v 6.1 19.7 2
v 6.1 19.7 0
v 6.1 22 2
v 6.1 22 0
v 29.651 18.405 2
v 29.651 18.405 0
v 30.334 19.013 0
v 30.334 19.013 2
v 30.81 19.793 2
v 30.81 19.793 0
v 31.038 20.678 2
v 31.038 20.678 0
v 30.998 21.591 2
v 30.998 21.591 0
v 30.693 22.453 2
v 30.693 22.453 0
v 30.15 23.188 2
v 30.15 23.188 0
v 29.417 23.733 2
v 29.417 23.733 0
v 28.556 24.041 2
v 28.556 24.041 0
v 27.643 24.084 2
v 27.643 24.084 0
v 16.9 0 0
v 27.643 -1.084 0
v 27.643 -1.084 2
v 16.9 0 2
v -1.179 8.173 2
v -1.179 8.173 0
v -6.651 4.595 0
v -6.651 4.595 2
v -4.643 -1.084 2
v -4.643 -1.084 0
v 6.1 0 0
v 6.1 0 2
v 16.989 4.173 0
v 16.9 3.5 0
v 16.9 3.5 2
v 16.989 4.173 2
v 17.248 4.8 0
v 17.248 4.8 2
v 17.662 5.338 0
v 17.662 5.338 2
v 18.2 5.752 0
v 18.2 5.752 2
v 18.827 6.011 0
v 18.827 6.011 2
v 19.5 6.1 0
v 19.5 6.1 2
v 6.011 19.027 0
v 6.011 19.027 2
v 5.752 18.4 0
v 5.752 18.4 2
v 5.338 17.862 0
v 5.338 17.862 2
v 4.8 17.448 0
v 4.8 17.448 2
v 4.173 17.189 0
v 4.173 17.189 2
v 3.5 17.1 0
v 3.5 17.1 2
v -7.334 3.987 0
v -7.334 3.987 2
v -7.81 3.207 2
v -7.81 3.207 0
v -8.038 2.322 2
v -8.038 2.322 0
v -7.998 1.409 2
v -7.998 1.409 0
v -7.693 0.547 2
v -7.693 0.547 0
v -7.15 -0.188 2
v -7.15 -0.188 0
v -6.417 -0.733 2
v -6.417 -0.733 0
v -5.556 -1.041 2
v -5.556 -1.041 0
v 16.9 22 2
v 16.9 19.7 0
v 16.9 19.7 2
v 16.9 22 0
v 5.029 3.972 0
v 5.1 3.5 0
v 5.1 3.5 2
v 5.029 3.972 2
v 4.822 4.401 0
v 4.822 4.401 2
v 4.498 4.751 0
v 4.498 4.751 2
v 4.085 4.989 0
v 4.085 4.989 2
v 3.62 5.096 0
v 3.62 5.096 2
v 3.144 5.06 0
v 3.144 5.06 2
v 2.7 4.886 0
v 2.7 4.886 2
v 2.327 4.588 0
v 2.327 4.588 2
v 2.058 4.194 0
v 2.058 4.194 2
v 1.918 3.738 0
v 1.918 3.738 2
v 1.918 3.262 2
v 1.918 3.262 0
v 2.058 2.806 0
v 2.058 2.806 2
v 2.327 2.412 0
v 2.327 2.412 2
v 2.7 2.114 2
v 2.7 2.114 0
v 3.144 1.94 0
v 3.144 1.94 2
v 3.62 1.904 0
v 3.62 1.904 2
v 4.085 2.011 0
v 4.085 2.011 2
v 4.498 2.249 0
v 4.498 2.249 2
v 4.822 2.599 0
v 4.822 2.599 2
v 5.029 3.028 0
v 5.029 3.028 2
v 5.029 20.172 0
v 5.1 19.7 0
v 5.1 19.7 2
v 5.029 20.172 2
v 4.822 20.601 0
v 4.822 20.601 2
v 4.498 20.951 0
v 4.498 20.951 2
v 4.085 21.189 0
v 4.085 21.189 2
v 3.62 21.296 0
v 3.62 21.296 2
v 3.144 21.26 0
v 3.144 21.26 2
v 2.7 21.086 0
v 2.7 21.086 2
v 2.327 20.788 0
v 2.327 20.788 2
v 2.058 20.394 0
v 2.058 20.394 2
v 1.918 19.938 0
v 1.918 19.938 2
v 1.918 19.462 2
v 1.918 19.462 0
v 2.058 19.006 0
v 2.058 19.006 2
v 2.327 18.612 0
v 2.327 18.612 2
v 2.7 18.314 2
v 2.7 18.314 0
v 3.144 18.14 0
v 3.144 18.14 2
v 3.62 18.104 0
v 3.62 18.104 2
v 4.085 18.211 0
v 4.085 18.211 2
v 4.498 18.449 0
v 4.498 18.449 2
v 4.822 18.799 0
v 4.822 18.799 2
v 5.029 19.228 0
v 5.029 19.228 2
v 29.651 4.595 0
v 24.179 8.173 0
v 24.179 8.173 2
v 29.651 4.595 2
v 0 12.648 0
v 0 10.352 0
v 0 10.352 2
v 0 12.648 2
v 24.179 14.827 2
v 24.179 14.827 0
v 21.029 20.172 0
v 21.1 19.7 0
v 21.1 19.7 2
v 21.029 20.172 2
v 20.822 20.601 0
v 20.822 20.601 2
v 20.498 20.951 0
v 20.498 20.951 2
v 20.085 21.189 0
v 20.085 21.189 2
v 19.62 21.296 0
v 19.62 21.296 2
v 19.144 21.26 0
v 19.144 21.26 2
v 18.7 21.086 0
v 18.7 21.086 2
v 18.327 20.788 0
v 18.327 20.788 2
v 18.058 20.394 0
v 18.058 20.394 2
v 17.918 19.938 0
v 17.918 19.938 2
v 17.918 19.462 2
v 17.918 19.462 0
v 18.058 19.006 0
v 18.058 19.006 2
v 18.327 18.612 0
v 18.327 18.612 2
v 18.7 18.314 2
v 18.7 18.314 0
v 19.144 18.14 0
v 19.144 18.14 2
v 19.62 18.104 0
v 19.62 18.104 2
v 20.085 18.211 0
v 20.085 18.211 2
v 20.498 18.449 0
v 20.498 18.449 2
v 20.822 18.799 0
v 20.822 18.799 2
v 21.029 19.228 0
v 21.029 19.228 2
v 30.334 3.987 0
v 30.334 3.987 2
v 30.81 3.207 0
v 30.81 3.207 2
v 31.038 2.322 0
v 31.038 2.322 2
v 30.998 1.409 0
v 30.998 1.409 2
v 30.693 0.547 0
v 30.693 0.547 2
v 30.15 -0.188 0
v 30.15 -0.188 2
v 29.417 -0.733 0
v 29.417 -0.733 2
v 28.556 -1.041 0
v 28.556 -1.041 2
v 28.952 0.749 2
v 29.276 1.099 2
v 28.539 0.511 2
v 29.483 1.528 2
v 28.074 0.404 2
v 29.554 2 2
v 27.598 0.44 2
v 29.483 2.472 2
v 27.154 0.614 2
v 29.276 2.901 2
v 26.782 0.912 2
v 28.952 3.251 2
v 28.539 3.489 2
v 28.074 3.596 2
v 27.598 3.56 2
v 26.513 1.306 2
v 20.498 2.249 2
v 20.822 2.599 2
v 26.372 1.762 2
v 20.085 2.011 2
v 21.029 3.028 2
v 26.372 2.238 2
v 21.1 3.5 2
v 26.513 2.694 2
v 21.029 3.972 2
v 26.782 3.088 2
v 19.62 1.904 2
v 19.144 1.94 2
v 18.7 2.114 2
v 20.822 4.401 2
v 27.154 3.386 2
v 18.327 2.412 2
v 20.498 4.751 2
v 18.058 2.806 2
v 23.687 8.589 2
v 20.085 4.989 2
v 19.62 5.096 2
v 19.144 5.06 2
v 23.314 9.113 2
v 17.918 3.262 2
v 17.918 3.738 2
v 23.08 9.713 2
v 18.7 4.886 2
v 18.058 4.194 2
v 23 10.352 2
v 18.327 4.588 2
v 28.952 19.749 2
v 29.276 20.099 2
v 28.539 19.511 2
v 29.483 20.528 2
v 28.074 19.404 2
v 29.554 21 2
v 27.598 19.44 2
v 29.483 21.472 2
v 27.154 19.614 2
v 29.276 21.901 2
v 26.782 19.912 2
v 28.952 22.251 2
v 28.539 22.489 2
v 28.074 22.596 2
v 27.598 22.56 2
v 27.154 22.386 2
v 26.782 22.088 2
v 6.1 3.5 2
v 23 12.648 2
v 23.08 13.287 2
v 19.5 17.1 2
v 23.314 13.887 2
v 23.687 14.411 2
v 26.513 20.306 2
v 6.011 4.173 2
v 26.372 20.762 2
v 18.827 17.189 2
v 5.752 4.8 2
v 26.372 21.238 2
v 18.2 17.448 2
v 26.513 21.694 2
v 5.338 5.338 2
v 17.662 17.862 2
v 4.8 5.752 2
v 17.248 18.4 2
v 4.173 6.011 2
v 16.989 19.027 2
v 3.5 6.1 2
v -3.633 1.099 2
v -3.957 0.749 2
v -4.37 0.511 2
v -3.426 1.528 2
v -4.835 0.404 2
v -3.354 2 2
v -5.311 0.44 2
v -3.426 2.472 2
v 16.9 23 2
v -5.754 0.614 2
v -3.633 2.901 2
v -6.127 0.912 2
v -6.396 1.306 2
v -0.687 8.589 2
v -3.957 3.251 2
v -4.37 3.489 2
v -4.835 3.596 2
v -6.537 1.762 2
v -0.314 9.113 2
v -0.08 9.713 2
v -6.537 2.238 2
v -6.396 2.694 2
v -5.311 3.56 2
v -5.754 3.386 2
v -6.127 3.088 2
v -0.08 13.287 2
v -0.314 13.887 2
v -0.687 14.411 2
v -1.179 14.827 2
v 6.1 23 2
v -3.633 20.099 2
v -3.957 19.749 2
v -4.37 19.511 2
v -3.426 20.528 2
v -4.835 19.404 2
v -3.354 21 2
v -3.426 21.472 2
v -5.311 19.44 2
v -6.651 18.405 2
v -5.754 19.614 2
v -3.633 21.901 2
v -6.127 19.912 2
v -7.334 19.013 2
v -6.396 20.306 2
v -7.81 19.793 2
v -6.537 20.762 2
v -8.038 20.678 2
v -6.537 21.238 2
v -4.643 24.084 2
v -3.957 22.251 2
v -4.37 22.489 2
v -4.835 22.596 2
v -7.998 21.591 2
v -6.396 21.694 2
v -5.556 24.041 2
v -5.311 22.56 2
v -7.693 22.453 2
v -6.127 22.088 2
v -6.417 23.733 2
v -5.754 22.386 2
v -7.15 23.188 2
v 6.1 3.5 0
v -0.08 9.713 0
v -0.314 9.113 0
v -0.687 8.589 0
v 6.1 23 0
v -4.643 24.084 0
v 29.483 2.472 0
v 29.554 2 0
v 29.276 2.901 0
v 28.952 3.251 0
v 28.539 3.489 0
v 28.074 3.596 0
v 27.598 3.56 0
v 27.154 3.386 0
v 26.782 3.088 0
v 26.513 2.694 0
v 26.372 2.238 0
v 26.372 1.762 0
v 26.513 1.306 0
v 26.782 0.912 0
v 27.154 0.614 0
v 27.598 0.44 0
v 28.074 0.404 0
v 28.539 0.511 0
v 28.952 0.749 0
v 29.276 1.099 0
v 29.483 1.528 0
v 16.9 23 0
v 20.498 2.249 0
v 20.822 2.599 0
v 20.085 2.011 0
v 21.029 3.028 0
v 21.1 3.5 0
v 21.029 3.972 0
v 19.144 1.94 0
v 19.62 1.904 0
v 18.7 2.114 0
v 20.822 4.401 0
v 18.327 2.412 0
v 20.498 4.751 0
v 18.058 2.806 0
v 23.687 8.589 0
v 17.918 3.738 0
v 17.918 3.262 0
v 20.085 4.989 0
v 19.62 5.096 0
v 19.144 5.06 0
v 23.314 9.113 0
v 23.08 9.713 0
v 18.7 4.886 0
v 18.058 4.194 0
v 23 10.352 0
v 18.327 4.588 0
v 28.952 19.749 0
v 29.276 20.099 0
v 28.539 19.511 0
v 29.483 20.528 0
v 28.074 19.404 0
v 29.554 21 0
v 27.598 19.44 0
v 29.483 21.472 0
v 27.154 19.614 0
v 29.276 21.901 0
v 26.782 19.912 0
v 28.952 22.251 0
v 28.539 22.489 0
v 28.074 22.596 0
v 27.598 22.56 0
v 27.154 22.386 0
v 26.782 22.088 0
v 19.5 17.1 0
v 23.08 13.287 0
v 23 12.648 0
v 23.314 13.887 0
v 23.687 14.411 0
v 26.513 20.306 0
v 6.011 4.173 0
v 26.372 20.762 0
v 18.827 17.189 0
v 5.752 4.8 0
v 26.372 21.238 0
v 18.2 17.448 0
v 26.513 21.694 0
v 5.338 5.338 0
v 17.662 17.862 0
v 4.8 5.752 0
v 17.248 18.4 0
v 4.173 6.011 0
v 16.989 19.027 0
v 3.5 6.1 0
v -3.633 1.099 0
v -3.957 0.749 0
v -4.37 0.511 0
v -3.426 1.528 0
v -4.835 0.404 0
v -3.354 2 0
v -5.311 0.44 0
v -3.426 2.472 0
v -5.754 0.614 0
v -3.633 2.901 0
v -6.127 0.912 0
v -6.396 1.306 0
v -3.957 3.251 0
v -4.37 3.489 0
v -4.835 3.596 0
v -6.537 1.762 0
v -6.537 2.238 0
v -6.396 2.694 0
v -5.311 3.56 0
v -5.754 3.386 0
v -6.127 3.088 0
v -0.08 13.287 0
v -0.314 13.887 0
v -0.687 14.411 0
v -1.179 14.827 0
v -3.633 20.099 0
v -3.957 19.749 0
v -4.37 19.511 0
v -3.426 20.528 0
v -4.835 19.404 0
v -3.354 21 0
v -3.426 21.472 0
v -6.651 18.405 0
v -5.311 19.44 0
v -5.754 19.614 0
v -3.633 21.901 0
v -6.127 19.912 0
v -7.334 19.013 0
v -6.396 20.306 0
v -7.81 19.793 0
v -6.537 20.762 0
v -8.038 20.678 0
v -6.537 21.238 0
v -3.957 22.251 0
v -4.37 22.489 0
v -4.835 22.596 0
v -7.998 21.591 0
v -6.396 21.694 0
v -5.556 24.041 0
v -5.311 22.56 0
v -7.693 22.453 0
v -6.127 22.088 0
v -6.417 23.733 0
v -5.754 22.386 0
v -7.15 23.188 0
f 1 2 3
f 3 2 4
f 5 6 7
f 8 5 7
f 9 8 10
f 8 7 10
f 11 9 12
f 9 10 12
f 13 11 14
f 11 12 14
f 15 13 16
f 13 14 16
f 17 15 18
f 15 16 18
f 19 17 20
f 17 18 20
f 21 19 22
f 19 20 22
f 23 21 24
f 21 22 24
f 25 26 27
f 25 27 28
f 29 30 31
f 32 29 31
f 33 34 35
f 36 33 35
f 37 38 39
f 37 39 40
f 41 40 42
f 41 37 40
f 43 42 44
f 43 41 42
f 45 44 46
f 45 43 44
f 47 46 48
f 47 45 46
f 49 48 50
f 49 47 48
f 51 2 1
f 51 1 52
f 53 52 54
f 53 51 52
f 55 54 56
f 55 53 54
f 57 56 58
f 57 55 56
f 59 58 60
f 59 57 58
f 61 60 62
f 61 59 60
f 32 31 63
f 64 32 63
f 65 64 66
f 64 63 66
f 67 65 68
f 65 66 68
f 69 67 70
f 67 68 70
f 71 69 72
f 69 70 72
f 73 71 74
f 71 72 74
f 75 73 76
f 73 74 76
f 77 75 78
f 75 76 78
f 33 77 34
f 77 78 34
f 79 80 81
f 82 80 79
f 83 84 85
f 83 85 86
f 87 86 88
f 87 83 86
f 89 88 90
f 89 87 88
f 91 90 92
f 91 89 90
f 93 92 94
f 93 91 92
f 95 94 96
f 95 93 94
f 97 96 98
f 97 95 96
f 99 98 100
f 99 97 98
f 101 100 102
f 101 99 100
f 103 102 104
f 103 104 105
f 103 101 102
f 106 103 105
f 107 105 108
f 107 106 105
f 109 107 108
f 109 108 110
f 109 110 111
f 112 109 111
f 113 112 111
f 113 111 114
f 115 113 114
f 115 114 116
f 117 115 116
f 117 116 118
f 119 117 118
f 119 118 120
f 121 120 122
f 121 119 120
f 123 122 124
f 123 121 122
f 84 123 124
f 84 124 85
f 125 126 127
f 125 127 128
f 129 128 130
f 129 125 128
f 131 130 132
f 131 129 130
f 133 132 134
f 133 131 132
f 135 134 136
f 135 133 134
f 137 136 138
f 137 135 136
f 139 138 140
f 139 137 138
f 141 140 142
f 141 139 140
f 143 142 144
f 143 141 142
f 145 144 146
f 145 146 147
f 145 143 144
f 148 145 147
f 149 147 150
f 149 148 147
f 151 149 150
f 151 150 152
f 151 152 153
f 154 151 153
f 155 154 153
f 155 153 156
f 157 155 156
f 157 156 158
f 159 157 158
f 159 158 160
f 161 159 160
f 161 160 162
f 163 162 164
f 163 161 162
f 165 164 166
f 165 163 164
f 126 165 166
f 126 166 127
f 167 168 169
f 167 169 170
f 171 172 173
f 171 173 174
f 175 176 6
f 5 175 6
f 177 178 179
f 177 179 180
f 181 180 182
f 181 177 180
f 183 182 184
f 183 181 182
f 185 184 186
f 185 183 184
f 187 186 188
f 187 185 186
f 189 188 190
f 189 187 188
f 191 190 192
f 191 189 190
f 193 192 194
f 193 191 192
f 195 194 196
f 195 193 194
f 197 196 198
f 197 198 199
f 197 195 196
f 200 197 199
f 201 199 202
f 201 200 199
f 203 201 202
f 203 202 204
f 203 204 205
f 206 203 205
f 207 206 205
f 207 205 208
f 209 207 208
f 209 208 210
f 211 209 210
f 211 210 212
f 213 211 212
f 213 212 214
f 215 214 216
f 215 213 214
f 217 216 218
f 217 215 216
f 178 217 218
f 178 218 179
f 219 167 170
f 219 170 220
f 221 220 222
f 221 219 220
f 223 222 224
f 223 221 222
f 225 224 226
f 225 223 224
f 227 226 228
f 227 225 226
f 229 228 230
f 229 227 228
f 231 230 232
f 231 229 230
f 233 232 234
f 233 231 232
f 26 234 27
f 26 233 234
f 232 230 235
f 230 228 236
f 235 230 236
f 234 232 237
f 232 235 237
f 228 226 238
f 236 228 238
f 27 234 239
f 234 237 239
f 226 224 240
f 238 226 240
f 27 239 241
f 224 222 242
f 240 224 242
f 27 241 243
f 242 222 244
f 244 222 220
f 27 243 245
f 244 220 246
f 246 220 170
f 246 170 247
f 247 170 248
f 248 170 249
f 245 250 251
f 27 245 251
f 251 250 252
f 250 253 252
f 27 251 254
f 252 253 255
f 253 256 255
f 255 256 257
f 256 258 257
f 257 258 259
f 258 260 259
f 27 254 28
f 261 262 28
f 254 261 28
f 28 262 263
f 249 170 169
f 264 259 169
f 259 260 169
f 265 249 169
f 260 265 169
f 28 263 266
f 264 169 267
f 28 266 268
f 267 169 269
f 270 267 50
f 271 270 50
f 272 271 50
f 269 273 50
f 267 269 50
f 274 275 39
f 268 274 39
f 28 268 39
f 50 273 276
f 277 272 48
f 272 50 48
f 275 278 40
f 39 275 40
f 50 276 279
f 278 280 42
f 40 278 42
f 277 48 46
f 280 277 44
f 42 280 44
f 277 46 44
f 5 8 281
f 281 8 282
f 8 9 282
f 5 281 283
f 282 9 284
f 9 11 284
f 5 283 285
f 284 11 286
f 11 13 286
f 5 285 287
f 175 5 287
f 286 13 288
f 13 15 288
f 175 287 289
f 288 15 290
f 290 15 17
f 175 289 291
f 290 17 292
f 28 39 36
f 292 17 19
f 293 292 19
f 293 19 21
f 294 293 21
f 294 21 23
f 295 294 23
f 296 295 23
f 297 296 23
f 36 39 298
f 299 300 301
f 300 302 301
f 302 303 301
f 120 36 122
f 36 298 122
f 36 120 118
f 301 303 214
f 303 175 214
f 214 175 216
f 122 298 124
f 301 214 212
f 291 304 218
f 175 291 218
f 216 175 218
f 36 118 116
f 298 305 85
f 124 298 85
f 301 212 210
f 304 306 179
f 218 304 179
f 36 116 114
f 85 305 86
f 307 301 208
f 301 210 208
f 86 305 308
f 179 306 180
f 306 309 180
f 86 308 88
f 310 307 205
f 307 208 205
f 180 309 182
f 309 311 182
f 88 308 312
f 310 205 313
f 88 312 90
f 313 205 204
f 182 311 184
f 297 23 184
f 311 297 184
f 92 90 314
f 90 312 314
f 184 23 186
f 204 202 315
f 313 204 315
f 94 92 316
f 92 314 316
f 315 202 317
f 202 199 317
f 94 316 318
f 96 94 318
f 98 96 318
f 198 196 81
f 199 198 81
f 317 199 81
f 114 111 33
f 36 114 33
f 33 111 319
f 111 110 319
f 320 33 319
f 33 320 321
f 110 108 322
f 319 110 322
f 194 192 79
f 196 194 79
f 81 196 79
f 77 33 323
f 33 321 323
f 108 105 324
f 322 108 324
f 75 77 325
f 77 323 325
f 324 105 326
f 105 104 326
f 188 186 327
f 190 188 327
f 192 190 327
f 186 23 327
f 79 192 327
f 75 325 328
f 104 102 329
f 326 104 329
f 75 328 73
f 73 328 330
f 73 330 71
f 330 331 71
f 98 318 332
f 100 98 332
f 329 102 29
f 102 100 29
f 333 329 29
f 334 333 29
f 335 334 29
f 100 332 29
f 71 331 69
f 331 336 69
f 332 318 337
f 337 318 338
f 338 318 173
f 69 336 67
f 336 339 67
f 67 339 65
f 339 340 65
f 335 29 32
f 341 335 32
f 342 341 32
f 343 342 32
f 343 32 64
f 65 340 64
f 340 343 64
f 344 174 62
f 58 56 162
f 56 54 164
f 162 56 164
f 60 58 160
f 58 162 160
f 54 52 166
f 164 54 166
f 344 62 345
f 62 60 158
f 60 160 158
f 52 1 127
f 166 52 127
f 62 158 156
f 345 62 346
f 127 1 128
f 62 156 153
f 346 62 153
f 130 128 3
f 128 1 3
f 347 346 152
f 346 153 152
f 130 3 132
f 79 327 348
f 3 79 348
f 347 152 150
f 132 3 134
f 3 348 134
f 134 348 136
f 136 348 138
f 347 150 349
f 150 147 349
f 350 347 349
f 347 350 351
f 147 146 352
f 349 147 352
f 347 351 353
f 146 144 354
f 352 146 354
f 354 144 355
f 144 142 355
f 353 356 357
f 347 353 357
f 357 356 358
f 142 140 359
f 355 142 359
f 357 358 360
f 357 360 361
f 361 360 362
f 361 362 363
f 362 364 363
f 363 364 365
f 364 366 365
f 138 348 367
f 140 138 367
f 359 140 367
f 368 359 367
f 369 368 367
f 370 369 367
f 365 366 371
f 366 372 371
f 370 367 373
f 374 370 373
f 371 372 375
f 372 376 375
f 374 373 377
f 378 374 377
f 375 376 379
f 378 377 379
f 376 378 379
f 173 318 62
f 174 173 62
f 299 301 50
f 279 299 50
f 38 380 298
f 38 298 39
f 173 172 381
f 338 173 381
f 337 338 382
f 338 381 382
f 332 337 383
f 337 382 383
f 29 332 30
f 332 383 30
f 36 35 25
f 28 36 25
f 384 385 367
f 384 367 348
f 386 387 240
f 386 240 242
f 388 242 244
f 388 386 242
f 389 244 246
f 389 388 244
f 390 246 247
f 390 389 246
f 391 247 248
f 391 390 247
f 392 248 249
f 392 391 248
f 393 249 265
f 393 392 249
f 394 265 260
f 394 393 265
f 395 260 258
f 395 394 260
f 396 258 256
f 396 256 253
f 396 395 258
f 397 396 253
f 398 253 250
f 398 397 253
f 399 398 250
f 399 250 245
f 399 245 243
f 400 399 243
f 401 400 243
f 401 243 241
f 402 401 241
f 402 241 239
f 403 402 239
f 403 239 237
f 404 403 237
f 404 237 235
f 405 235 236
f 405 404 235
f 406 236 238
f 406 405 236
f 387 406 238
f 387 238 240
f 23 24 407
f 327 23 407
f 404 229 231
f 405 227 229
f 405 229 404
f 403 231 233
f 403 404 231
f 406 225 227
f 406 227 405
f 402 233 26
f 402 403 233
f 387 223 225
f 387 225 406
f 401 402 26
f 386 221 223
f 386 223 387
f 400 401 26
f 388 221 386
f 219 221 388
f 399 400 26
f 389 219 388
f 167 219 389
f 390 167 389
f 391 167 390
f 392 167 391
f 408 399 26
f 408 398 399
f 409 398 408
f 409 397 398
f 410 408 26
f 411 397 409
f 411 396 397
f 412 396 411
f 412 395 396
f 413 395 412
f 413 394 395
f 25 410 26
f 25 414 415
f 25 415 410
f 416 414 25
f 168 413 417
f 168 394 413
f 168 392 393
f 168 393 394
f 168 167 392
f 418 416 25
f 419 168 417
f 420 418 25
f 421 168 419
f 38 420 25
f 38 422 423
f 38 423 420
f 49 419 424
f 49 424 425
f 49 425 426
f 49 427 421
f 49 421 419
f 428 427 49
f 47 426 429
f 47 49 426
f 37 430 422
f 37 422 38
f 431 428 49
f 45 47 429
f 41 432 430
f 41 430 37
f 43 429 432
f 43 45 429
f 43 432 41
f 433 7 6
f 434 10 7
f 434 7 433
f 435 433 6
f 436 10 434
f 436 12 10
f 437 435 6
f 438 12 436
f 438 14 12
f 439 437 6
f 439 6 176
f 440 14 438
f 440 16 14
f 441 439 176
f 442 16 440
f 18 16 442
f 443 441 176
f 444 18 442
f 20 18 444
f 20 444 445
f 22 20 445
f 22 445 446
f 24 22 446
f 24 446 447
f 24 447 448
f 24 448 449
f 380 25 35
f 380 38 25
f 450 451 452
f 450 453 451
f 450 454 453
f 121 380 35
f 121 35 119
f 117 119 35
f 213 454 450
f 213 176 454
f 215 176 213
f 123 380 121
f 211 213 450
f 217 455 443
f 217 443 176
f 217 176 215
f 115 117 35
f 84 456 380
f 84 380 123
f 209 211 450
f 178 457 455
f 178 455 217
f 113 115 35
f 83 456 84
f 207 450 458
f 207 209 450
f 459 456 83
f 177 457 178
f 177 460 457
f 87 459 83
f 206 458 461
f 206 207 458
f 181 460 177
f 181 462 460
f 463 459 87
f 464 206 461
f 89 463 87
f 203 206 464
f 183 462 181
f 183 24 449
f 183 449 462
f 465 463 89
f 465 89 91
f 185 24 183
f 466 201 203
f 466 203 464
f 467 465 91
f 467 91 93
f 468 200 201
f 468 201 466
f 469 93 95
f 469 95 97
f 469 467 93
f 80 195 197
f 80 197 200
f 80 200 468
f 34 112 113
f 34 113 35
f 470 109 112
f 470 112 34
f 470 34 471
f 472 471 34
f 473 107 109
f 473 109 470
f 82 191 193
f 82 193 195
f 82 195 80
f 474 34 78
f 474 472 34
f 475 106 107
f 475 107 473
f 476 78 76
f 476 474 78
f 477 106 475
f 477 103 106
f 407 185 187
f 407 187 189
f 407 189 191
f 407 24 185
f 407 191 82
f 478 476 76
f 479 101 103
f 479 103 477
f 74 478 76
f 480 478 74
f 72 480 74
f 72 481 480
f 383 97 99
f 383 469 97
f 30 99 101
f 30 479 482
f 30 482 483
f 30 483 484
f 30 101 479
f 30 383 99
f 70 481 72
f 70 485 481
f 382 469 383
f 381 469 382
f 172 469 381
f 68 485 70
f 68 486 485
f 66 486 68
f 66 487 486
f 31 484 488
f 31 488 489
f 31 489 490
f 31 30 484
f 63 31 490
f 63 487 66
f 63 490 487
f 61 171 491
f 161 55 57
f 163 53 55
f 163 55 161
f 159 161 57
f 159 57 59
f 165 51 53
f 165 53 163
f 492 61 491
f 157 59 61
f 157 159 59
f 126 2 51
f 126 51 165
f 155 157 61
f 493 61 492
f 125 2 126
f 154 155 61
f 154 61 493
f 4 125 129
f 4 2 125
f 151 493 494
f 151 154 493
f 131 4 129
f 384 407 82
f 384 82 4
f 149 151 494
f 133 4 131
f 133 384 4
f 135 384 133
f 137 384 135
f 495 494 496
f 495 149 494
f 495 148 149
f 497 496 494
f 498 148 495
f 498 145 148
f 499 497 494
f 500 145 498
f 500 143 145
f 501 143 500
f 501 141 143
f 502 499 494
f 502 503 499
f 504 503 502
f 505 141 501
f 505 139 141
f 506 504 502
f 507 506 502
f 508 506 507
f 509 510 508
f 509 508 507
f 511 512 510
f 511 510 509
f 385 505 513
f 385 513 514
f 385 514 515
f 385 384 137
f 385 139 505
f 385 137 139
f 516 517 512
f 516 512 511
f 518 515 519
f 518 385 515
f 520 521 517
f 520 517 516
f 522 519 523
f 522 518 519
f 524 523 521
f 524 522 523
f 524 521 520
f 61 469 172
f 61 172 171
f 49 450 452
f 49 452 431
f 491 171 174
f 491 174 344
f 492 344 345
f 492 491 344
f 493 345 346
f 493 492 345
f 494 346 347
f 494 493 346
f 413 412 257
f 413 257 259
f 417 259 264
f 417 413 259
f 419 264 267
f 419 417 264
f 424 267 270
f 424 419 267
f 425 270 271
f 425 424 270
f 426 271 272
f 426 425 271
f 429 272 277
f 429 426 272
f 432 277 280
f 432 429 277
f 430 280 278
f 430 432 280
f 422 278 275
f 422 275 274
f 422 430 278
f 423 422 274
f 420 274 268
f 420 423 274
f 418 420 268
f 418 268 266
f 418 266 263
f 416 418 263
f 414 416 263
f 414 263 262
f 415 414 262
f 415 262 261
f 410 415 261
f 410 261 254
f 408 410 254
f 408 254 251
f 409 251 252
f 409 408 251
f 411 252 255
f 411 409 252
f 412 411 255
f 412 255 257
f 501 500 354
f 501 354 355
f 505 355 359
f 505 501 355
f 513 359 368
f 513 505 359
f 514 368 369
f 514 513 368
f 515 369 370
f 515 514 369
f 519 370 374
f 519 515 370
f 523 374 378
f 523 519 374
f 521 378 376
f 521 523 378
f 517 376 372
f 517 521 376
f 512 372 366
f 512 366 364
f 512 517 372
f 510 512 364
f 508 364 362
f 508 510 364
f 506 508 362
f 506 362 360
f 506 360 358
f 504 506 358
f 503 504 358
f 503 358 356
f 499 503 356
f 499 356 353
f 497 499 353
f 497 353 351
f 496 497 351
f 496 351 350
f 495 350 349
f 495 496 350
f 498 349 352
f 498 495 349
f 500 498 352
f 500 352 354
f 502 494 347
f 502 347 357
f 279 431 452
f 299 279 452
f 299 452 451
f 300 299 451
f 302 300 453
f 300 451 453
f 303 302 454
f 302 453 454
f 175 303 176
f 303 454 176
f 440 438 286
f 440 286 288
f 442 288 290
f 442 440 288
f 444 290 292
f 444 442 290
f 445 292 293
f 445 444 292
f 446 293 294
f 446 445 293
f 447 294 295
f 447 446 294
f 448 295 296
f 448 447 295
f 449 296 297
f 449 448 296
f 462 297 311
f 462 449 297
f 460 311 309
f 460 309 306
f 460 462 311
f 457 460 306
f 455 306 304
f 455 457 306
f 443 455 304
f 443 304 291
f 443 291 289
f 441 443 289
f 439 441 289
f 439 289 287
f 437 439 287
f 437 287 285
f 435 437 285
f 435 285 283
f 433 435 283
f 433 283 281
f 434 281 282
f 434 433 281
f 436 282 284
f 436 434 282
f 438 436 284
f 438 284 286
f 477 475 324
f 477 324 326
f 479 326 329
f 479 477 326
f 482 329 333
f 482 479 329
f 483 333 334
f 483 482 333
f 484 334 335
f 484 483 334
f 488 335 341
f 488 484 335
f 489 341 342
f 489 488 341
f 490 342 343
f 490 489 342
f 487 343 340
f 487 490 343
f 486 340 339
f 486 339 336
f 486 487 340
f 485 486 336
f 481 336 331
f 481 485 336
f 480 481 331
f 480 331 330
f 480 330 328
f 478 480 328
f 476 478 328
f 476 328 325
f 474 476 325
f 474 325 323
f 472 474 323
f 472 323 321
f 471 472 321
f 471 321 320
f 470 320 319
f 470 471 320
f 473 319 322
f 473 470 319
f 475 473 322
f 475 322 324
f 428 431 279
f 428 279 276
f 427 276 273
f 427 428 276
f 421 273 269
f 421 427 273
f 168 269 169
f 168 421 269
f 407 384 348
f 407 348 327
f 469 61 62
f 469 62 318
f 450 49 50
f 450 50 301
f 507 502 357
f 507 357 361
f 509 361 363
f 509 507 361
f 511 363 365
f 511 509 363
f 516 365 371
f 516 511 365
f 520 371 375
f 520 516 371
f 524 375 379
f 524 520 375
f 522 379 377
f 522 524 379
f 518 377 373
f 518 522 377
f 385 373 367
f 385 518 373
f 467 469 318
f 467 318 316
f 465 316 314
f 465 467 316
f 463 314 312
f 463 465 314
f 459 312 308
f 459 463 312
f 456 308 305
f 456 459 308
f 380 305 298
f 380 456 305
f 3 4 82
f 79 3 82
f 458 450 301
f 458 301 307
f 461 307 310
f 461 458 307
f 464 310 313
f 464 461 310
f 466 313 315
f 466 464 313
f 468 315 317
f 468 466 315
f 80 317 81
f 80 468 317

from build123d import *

# Parameters (mm, degrees)
SKETCH1_W             = 23
SKETCH1_H             = 23
BOSS_EXTRUDE1_DEPTH   = 2
FILLET1_R             = 2
SKETCH2_R             = 1.6
CUT_EXTRUDE1_DEPTH    = 2
SKETCH3_W             = 10.8
SKETCH3_H             = 2.3
CUT_EXTRUDE2_DEPTH    = 2
SKETCH5_R             = 1.6
BOSS_EXTRUDE2_DEPTH   = 2
BOSS_EXTRUDE2_2_DEPTH = 2
BOSS_EXTRUDE2_3_DEPTH = 2
BOSS_EXTRUDE2_4_DEPTH = 2


with BuildPart() as part:
    # Sketch1 → Boss-Extrude1 (new body)
    with BuildSketch(Plane.XY):
        with Locations((11.5, 11.5)):
            Rectangle(SKETCH1_W, SKETCH1_H)
    extrude(amount=BOSS_EXTRUDE1_DEPTH)

    # Fillet1
    fillet1_edges = [part.edges().sort_by_distance(p)[0] for p in [
        (0, 23, 1),
        (23, 23, 1),
        (23, 0, 1),
        (0, 0, 1),
    ]]
    fillet(fillet1_edges, radius=FILLET1_R)

    # Sketch2 → Cut-Extrude1 (cut)
    with BuildSketch(Plane.XY):
        with Locations((3.5, 19.7)):
            Circle(SKETCH2_R)
        with Locations((19.5, 19.7)):
            Circle(SKETCH2_R)
        with Locations((19.5, 3.5)):
            Circle(SKETCH2_R)
        with Locations((3.5, 3.5)):
            Circle(SKETCH2_R)
        with BuildLine():
            Line((3.5, 17.1), (3.5, 6.1))
            ThreePointArc((3.5, 6.1), (5.338477631, 5.338477631), (6.1, 3.5))
            Line((6.1, 3.5), (16.9, 3.5))
            ThreePointArc((16.9, 3.5), (17.661522369, 5.338477631), (19.5, 6.1))
            Line((19.5, 6.1), (19.5, 17.1))
            ThreePointArc((19.5, 17.1), (17.661522369, 17.861522369), (16.9, 19.7))
            Line((16.9, 19.7), (6.1, 19.7))
            ThreePointArc((6.1, 19.7), (5.338477631, 17.861522369), (3.5, 17.1))
        make_face()
    extrude(amount=CUT_EXTRUDE1_DEPTH, mode=Mode.SUBTRACT)

    # Sketch3 → Cut-Extrude2 (cut)
    with BuildSketch(Plane.XY):
        with Locations((11.5, 20.85)):
            Rectangle(SKETCH3_W, SKETCH3_H)
    extrude(amount=CUT_EXTRUDE2_DEPTH, mode=Mode.SUBTRACT)


with BuildPart() as body_2:
    # Sketch5 → Boss-Extrude2 (new body)
    with BuildSketch(Plane.XY):
        with BuildLine():
            Line((16.9, 23), (21.776453683, 21.561960094))
            Line((21.776453683, 21.561960094), (23, 12.648059803))
            ThreePointArc((23, 12.648059803), (23.313519219, 13.886650017), (24.17856315, 14.826915413))
            Line((24.17856315, 14.826915413), (29.65108056, 18.405475842))
            ThreePointArc((29.65108056, 18.405475842), (30.877170115, 22.033391556), (27.643175365, 24.084329386))
            Line((27.643175365, 24.084329386), (16.9, 23))
        make_face()
        with Locations((27.954482672, 21)):
            Circle(SKETCH5_R, mode=Mode.SUBTRACT)
    extrude(amount=BOSS_EXTRUDE2_DEPTH)


with BuildPart() as body_3:
    # Sketch5 → Boss-Extrude2 2 (new body)
    with BuildSketch(Plane.XY):
        with BuildLine():
            Line((-4.643175365, 24.084329386), (6.1, 23))
            Line((6.1, 23), (1.223546317, 21.561960094))
            Line((1.223546317, 21.561960094), (0, 12.648059803))
            ThreePointArc((0, 12.648059803), (-0.313519219, 13.886650017), (-1.17856315, 14.826915413))
            Line((-1.17856315, 14.826915413), (-6.65108056, 18.405475842))
            ThreePointArc((-6.65108056, 18.405475842), (-7.877170115, 22.033391556), (-4.643175365, 24.084329386))
        make_face()
        with Locations((-4.954482672, 21)):
            Circle(SKETCH5_R, mode=Mode.SUBTRACT)
    extrude(amount=BOSS_EXTRUDE2_2_DEPTH)


with BuildPart() as body_4:
    # Sketch5 → Boss-Extrude2 3 (new body)
    with BuildSketch(Plane.XY):
        with BuildLine():
            Line((16.9, 0), (21.776453683, 1.438039906))
            Line((21.776453683, 1.438039906), (23, 10.351940197))
            ThreePointArc((23, 10.351940197), (23.313519219, 9.113349983), (24.17856315, 8.173084587))
            Line((24.17856315, 8.173084587), (29.65108056, 4.594524158))
            ThreePointArc((29.65108056, 4.594524158), (30.877170115, 0.966608444), (27.643175365, -1.084329386))
            Line((27.643175365, -1.084329386), (16.9, 0))
        make_face()
        with Locations((27.954482672, 2)):
            Circle(SKETCH5_R, mode=Mode.SUBTRACT)
    extrude(amount=BOSS_EXTRUDE2_3_DEPTH)


with BuildPart() as body_5:
    # Sketch5 → Boss-Extrude2 4 (new body)
    with BuildSketch(Plane.XY):
        with BuildLine():
            Line((6.1, 0), (1.223546317, 1.438039906))
            Line((1.223546317, 1.438039906), (0, 10.351940197))
            ThreePointArc((0, 10.351940197), (-0.313519219, 9.113349983), (-1.17856315, 8.173084587))
            Line((-1.17856315, 8.173084587), (-6.65108056, 4.594524158))
            ThreePointArc((-6.65108056, 4.594524158), (-7.877170115, 0.966608444), (-4.643175365, -1.084329386))
            Line((-4.643175365, -1.084329386), (6.1, 0))
        make_face()
        with Locations((-4.954482672, 2)):
            Circle(SKETCH5_R, mode=Mode.SUBTRACT)
    extrude(amount=BOSS_EXTRUDE2_4_DEPTH)

    # Combine1: union part, body 3, body 2, body 4
    add(part.part)
    add(body_3.part)
    add(body_2.part)
    add(body_4.part)


solid = body_5.part
